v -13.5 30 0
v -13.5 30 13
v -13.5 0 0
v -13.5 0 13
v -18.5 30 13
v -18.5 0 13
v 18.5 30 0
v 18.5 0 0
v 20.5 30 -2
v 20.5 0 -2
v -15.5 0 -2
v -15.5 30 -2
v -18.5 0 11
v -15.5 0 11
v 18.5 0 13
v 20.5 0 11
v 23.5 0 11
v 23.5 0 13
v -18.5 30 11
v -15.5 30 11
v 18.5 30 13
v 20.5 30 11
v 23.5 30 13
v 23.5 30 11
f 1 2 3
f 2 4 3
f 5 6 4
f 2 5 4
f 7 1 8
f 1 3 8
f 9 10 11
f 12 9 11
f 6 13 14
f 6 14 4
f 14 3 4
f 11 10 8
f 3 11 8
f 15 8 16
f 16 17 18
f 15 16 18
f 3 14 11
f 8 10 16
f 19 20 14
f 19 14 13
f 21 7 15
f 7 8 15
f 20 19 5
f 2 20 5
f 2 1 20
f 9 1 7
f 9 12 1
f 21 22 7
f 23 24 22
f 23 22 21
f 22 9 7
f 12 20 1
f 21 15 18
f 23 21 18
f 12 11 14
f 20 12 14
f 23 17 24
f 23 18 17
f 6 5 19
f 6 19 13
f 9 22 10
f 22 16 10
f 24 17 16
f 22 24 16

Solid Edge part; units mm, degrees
sketch "Sketch1" plane through (0, 0, 0) normal (0, -1, 0) x (1, 0, 0)
  line L0 (-13.5, 13) -> (-13.5, 0)
  line L1 (-13.5, 0) -> (13.5, 0)
  line L2 (13.5, 0) -> (13.5, 13)
  line L3 (13.5, 13) -> (33.5, 13)
  line L4 (33.5, 13) -> (33.5, 11)
  line L5 (33.5, 11) -> (15.5, 11)
  line L6 (15.5, 11) -> (15.5, -2)
  line L7 (15.5, -2) -> (-15.5, -2)
  line L8 (-15.5, -2) -> (-15.5, 11)
  line L9 (-15.5, 11) -> (-35.5, 11)
  line L10 (-35.5, 11) -> (-35.5, 13)
  line L11 (-35.5, 13) -> (-13.5, 13)
extrude "Protrusion1" add sketch "Sketch1" against normal blind 20
sketch "Sketch2" plane through (-1, 0, 5.5) normal (0, -1, 0) x (1, 0, 0)
  line L0 (21.5, 5.5) -> (21.5, -7.5)
  line L1 (21.5, -7.5) -> (-14.5, -7.5)
  line L2 (-14.5, -7.5) -> (-14.5, 5.5)
  line L3 (-14.5, 5.5) -> (-34.5, 5.5)
  line L4 (-34.5, 5.5) -> (-34.5, 7.5)
  line L5 (-34.5, 7.5) -> (-12.5, 7.5)
  line L6 (-12.5, 7.5) -> (-12.5, -5.5)
  line L7 (-12.5, -5.5) -> (19.5, -5.5)
  line L8 (19.5, -5.5) -> (19.5, 7.5)
  line L9 (19.5, 7.5) -> (39.5, 7.5)
  line L10 (39.5, 7.5) -> (39.5, 5.5)
  line L11 (39.5, 5.5) -> (21.5, 5.5)
extrude "ExtrudedProtrusion_2" add sketch "Sketch2" against normal blind 30
sketch "Sketch3" plane through (26, 15, 13) normal (0, 0, 1) x (1, 0, 0)
  line L0 (-12.5, -15) -> (-12.5, 5)
  line L1 (-12.5, 5) -> (-7.5, 5)
  line L2 (-7.5, 5) -> (-7.5, -15)
  line L3 (-7.5, -15) -> (-12.5, -15)
extrude "Cutout1" cut sketch "Sketch3" against normal up to next
sketch "Sketch4" plane through (2.5, 15, -2) normal (0, 0, -1) x (1, 0, 0)
  line L0 (11, -5) -> (16, -5)
  line L1 (16, -5) -> (16, 15)
  line L2 (16, 15) -> (10.9467, 15)
  line L3 (10.9467, 15) -> (11, -5)
extrude "ExtrudedProtrusion_3" add sketch "Sketch4" against normal blind 2
sketch "Sketch5" plane through (-24.5, 15, 13) normal (0, 0, 1) x (0, 1, 0)
  line L0 (15, -6) -> (-15, -6)
  line L1 (-15, -6) -> (-15, 11)
  line L2 (-15, 11) -> (15, 11)
  line L3 (15, 11) -> (15, -6)
  line L4 (-15, -48) -> (15, -48)
  line L5 (15, -48) -> (15, -63)
  line L6 (15, -63) -> (-15, -63)
  line L7 (-15, -63) -> (-15, -48)
extrude "Cutout2" cut sketch "Sketch5" against normal up to next
